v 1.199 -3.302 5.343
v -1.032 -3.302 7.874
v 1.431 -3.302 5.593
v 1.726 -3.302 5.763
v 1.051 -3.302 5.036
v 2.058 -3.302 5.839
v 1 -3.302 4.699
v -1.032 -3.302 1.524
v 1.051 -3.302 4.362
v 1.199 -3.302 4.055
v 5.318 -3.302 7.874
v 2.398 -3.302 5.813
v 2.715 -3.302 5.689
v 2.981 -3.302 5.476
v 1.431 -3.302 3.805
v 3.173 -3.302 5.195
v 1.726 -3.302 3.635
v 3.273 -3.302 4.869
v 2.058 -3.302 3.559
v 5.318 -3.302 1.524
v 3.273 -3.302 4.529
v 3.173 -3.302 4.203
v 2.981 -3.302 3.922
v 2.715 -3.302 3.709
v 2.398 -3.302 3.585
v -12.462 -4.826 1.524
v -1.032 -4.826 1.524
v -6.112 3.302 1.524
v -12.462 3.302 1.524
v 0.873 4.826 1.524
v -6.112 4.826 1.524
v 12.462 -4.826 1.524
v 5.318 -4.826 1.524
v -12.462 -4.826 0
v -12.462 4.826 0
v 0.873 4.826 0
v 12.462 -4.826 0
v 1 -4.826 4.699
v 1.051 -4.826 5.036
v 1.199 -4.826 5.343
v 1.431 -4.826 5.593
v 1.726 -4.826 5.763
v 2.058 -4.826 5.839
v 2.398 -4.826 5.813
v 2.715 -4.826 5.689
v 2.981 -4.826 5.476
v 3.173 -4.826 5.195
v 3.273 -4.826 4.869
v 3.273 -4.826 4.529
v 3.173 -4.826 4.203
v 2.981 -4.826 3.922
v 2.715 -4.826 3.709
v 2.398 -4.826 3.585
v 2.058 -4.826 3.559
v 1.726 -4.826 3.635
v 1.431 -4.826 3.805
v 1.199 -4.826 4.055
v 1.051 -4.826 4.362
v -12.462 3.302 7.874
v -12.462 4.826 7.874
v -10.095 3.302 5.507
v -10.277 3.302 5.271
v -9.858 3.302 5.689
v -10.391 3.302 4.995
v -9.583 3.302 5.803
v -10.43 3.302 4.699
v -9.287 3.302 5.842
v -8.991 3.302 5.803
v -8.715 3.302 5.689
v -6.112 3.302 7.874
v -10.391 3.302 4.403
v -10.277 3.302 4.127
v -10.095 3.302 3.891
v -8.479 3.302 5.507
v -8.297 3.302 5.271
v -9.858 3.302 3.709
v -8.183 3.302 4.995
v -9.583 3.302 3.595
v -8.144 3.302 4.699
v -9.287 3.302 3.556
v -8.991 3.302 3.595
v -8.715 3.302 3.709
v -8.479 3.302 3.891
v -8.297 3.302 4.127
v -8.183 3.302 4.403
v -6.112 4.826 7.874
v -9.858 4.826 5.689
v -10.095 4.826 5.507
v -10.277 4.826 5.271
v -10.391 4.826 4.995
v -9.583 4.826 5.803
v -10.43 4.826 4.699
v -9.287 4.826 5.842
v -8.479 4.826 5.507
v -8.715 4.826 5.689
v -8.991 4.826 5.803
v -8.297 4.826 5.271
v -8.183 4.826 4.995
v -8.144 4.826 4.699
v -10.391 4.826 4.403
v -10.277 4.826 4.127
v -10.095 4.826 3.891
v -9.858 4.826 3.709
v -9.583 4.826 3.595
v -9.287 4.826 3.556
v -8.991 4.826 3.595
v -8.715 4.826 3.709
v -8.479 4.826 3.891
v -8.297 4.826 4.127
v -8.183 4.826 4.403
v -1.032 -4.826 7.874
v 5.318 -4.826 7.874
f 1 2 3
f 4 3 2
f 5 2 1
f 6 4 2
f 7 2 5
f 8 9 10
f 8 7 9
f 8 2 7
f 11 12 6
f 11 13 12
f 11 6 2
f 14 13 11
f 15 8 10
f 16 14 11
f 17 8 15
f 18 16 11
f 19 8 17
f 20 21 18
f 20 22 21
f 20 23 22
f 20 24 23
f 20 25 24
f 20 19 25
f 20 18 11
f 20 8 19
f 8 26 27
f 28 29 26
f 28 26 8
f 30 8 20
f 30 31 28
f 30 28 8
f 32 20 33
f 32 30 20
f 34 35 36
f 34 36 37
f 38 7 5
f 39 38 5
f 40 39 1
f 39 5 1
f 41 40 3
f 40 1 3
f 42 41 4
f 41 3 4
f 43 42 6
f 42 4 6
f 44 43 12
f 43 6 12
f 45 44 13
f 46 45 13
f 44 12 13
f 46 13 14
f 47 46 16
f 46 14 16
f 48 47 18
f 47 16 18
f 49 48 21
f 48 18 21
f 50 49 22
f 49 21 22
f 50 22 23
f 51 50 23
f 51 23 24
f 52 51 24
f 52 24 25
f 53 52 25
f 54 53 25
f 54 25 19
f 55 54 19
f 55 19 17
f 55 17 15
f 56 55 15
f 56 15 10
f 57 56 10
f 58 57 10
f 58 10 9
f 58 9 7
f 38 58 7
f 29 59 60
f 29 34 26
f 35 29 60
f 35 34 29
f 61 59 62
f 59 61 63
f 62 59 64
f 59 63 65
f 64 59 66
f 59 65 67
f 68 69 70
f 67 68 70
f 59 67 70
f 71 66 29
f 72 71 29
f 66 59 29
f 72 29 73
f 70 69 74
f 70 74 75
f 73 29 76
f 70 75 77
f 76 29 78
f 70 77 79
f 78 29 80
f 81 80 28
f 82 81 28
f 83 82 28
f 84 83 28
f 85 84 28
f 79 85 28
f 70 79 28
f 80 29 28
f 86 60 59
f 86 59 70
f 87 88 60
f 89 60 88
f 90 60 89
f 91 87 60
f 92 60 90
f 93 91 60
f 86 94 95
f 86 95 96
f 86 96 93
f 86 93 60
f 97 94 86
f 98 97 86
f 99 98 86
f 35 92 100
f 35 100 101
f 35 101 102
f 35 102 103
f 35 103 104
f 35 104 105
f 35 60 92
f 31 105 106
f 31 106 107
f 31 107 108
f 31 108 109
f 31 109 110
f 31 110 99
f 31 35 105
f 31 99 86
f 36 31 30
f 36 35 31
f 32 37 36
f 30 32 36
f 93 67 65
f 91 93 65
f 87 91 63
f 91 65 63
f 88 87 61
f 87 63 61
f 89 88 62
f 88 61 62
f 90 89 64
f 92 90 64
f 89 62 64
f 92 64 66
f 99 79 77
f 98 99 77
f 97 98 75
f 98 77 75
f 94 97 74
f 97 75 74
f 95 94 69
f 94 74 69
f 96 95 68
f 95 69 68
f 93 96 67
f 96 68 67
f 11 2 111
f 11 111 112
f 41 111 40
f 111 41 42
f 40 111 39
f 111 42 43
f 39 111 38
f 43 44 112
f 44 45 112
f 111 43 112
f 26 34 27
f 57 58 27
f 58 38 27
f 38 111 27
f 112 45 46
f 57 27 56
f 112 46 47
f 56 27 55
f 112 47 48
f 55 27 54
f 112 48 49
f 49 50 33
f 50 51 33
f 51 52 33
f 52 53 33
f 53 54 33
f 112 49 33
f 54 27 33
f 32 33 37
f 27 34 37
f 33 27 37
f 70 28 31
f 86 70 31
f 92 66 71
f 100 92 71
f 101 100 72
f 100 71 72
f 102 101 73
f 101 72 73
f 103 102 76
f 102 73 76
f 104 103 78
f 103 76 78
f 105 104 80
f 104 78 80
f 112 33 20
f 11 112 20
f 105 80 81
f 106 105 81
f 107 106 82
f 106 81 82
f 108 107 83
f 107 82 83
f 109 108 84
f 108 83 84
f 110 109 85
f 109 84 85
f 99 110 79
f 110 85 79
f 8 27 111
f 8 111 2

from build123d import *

# Parameters (mm, degrees)
F0_W     = 4.572
F0_H     = 1.524
F0_W_2   = 1.778
F0_H_2   = 8.128
F0_W_3   = 6.35
F1_DEPTH = 1.524
F2_W     = 6.35
F2_H     = 1.524
F3_DEPTH = 6.35
F5_DEPTH = 2.54
F6_DEPTH = 6.35
F7_R     = 1.143
F8_DEPTH = 2.54


with BuildPart() as f1:
    # F0 (on Top) → F1 (new body)
    with BuildSketch(Plane.XY):
        with Locations((3.159252, -4.064)):
            Rectangle(F0_W, F0_H)
        with Locations((-0.015748, 0.762)):
            Rectangle(F0_W_2, F0_H_2)
        Polygon((-0.904748, -3.302), (-0.904748, 4.826), (-6.111748, 4.826), (-6.111748, 3.302), (-12.461748, 3.302), (-12.461748, -4.826), (-0.904748, -4.826), align=None)
        Polygon((7.2287730873, -4.826), (12.461748, -4.826), (0.873252, 4.826), (0.873252, -3.302), (5.445252, -3.302), (5.445252, -4.826), align=None)
        with Locations((-9.286748, 4.064)):
            Rectangle(F0_W_3, F0_H)
        with Locations((-0.015748, -4.064)):
            Rectangle(F0_W_2, F0_H)
    extrude(amount=F1_DEPTH)

    # F2 (on face) → F3 (join)
    with BuildSketch(Plane.XY.offset(1.524)):
        with Locations((-9.286748, 4.064)):
            Rectangle(F2_W, F2_H)
    extrude(amount=F3_DEPTH)

    # F4 (on face) → F5 (cut)
    with BuildSketch(Plane.XZ.offset(-3.302)):
        with BuildLine():
            Line((-9.286748, 4.699), (-8.143748, 4.699))
            ThreePointArc((-8.143748, 4.699), (-8.4785249491, 5.5072230509), (-9.286748, 5.842))
            Line((-9.286748, 5.842), (-9.286748, 4.699))
        make_face()
        with BuildLine():
            Line((-10.429748, 4.699), (-9.286748, 4.699))
            Line((-9.286748, 4.699), (-9.286748, 5.842))
            ThreePointArc((-9.286748, 5.842), (-10.0949710509, 5.5072230509), (-10.429748, 4.699))
        make_face()
        with BuildLine():
            Line((-9.286748, 3.556), (-9.286748, 4.699))
            Line((-9.286748, 4.699), (-10.429748, 4.699))
            ThreePointArc((-10.429748, 4.699), (-10.0949710509, 3.8907769491), (-9.286748, 3.556))
        make_face()
        with BuildLine():
            ThreePointArc((-9.286748, 3.556), (-8.4785249491, 3.8907769491), (-8.143748, 4.699))
            Line((-8.143748, 4.699), (-9.286748, 4.699))
            Line((-9.286748, 4.699), (-9.286748, 3.556))
        make_face()
    extrude(amount=-F5_DEPTH, mode=Mode.SUBTRACT)

    # F2 (on face) → F6 (join)
    with BuildSketch(Plane.XY.offset(1.524)):
        with Locations((2.143252, -4.064)):
            Rectangle(F2_W, F2_H)
    extrude(amount=F6_DEPTH)

    # F7 (on face) → F8 (cut)
    with BuildSketch(Plane(origin=(0, -3.302, 0), x_dir=(-1, 0, 0), z_dir=(0, 1, 0))):
        with Locations((-2.143252, 4.699)):
            Circle(F7_R)
    extrude(amount=-F8_DEPTH, mode=Mode.SUBTRACT)


solid = f1.part
